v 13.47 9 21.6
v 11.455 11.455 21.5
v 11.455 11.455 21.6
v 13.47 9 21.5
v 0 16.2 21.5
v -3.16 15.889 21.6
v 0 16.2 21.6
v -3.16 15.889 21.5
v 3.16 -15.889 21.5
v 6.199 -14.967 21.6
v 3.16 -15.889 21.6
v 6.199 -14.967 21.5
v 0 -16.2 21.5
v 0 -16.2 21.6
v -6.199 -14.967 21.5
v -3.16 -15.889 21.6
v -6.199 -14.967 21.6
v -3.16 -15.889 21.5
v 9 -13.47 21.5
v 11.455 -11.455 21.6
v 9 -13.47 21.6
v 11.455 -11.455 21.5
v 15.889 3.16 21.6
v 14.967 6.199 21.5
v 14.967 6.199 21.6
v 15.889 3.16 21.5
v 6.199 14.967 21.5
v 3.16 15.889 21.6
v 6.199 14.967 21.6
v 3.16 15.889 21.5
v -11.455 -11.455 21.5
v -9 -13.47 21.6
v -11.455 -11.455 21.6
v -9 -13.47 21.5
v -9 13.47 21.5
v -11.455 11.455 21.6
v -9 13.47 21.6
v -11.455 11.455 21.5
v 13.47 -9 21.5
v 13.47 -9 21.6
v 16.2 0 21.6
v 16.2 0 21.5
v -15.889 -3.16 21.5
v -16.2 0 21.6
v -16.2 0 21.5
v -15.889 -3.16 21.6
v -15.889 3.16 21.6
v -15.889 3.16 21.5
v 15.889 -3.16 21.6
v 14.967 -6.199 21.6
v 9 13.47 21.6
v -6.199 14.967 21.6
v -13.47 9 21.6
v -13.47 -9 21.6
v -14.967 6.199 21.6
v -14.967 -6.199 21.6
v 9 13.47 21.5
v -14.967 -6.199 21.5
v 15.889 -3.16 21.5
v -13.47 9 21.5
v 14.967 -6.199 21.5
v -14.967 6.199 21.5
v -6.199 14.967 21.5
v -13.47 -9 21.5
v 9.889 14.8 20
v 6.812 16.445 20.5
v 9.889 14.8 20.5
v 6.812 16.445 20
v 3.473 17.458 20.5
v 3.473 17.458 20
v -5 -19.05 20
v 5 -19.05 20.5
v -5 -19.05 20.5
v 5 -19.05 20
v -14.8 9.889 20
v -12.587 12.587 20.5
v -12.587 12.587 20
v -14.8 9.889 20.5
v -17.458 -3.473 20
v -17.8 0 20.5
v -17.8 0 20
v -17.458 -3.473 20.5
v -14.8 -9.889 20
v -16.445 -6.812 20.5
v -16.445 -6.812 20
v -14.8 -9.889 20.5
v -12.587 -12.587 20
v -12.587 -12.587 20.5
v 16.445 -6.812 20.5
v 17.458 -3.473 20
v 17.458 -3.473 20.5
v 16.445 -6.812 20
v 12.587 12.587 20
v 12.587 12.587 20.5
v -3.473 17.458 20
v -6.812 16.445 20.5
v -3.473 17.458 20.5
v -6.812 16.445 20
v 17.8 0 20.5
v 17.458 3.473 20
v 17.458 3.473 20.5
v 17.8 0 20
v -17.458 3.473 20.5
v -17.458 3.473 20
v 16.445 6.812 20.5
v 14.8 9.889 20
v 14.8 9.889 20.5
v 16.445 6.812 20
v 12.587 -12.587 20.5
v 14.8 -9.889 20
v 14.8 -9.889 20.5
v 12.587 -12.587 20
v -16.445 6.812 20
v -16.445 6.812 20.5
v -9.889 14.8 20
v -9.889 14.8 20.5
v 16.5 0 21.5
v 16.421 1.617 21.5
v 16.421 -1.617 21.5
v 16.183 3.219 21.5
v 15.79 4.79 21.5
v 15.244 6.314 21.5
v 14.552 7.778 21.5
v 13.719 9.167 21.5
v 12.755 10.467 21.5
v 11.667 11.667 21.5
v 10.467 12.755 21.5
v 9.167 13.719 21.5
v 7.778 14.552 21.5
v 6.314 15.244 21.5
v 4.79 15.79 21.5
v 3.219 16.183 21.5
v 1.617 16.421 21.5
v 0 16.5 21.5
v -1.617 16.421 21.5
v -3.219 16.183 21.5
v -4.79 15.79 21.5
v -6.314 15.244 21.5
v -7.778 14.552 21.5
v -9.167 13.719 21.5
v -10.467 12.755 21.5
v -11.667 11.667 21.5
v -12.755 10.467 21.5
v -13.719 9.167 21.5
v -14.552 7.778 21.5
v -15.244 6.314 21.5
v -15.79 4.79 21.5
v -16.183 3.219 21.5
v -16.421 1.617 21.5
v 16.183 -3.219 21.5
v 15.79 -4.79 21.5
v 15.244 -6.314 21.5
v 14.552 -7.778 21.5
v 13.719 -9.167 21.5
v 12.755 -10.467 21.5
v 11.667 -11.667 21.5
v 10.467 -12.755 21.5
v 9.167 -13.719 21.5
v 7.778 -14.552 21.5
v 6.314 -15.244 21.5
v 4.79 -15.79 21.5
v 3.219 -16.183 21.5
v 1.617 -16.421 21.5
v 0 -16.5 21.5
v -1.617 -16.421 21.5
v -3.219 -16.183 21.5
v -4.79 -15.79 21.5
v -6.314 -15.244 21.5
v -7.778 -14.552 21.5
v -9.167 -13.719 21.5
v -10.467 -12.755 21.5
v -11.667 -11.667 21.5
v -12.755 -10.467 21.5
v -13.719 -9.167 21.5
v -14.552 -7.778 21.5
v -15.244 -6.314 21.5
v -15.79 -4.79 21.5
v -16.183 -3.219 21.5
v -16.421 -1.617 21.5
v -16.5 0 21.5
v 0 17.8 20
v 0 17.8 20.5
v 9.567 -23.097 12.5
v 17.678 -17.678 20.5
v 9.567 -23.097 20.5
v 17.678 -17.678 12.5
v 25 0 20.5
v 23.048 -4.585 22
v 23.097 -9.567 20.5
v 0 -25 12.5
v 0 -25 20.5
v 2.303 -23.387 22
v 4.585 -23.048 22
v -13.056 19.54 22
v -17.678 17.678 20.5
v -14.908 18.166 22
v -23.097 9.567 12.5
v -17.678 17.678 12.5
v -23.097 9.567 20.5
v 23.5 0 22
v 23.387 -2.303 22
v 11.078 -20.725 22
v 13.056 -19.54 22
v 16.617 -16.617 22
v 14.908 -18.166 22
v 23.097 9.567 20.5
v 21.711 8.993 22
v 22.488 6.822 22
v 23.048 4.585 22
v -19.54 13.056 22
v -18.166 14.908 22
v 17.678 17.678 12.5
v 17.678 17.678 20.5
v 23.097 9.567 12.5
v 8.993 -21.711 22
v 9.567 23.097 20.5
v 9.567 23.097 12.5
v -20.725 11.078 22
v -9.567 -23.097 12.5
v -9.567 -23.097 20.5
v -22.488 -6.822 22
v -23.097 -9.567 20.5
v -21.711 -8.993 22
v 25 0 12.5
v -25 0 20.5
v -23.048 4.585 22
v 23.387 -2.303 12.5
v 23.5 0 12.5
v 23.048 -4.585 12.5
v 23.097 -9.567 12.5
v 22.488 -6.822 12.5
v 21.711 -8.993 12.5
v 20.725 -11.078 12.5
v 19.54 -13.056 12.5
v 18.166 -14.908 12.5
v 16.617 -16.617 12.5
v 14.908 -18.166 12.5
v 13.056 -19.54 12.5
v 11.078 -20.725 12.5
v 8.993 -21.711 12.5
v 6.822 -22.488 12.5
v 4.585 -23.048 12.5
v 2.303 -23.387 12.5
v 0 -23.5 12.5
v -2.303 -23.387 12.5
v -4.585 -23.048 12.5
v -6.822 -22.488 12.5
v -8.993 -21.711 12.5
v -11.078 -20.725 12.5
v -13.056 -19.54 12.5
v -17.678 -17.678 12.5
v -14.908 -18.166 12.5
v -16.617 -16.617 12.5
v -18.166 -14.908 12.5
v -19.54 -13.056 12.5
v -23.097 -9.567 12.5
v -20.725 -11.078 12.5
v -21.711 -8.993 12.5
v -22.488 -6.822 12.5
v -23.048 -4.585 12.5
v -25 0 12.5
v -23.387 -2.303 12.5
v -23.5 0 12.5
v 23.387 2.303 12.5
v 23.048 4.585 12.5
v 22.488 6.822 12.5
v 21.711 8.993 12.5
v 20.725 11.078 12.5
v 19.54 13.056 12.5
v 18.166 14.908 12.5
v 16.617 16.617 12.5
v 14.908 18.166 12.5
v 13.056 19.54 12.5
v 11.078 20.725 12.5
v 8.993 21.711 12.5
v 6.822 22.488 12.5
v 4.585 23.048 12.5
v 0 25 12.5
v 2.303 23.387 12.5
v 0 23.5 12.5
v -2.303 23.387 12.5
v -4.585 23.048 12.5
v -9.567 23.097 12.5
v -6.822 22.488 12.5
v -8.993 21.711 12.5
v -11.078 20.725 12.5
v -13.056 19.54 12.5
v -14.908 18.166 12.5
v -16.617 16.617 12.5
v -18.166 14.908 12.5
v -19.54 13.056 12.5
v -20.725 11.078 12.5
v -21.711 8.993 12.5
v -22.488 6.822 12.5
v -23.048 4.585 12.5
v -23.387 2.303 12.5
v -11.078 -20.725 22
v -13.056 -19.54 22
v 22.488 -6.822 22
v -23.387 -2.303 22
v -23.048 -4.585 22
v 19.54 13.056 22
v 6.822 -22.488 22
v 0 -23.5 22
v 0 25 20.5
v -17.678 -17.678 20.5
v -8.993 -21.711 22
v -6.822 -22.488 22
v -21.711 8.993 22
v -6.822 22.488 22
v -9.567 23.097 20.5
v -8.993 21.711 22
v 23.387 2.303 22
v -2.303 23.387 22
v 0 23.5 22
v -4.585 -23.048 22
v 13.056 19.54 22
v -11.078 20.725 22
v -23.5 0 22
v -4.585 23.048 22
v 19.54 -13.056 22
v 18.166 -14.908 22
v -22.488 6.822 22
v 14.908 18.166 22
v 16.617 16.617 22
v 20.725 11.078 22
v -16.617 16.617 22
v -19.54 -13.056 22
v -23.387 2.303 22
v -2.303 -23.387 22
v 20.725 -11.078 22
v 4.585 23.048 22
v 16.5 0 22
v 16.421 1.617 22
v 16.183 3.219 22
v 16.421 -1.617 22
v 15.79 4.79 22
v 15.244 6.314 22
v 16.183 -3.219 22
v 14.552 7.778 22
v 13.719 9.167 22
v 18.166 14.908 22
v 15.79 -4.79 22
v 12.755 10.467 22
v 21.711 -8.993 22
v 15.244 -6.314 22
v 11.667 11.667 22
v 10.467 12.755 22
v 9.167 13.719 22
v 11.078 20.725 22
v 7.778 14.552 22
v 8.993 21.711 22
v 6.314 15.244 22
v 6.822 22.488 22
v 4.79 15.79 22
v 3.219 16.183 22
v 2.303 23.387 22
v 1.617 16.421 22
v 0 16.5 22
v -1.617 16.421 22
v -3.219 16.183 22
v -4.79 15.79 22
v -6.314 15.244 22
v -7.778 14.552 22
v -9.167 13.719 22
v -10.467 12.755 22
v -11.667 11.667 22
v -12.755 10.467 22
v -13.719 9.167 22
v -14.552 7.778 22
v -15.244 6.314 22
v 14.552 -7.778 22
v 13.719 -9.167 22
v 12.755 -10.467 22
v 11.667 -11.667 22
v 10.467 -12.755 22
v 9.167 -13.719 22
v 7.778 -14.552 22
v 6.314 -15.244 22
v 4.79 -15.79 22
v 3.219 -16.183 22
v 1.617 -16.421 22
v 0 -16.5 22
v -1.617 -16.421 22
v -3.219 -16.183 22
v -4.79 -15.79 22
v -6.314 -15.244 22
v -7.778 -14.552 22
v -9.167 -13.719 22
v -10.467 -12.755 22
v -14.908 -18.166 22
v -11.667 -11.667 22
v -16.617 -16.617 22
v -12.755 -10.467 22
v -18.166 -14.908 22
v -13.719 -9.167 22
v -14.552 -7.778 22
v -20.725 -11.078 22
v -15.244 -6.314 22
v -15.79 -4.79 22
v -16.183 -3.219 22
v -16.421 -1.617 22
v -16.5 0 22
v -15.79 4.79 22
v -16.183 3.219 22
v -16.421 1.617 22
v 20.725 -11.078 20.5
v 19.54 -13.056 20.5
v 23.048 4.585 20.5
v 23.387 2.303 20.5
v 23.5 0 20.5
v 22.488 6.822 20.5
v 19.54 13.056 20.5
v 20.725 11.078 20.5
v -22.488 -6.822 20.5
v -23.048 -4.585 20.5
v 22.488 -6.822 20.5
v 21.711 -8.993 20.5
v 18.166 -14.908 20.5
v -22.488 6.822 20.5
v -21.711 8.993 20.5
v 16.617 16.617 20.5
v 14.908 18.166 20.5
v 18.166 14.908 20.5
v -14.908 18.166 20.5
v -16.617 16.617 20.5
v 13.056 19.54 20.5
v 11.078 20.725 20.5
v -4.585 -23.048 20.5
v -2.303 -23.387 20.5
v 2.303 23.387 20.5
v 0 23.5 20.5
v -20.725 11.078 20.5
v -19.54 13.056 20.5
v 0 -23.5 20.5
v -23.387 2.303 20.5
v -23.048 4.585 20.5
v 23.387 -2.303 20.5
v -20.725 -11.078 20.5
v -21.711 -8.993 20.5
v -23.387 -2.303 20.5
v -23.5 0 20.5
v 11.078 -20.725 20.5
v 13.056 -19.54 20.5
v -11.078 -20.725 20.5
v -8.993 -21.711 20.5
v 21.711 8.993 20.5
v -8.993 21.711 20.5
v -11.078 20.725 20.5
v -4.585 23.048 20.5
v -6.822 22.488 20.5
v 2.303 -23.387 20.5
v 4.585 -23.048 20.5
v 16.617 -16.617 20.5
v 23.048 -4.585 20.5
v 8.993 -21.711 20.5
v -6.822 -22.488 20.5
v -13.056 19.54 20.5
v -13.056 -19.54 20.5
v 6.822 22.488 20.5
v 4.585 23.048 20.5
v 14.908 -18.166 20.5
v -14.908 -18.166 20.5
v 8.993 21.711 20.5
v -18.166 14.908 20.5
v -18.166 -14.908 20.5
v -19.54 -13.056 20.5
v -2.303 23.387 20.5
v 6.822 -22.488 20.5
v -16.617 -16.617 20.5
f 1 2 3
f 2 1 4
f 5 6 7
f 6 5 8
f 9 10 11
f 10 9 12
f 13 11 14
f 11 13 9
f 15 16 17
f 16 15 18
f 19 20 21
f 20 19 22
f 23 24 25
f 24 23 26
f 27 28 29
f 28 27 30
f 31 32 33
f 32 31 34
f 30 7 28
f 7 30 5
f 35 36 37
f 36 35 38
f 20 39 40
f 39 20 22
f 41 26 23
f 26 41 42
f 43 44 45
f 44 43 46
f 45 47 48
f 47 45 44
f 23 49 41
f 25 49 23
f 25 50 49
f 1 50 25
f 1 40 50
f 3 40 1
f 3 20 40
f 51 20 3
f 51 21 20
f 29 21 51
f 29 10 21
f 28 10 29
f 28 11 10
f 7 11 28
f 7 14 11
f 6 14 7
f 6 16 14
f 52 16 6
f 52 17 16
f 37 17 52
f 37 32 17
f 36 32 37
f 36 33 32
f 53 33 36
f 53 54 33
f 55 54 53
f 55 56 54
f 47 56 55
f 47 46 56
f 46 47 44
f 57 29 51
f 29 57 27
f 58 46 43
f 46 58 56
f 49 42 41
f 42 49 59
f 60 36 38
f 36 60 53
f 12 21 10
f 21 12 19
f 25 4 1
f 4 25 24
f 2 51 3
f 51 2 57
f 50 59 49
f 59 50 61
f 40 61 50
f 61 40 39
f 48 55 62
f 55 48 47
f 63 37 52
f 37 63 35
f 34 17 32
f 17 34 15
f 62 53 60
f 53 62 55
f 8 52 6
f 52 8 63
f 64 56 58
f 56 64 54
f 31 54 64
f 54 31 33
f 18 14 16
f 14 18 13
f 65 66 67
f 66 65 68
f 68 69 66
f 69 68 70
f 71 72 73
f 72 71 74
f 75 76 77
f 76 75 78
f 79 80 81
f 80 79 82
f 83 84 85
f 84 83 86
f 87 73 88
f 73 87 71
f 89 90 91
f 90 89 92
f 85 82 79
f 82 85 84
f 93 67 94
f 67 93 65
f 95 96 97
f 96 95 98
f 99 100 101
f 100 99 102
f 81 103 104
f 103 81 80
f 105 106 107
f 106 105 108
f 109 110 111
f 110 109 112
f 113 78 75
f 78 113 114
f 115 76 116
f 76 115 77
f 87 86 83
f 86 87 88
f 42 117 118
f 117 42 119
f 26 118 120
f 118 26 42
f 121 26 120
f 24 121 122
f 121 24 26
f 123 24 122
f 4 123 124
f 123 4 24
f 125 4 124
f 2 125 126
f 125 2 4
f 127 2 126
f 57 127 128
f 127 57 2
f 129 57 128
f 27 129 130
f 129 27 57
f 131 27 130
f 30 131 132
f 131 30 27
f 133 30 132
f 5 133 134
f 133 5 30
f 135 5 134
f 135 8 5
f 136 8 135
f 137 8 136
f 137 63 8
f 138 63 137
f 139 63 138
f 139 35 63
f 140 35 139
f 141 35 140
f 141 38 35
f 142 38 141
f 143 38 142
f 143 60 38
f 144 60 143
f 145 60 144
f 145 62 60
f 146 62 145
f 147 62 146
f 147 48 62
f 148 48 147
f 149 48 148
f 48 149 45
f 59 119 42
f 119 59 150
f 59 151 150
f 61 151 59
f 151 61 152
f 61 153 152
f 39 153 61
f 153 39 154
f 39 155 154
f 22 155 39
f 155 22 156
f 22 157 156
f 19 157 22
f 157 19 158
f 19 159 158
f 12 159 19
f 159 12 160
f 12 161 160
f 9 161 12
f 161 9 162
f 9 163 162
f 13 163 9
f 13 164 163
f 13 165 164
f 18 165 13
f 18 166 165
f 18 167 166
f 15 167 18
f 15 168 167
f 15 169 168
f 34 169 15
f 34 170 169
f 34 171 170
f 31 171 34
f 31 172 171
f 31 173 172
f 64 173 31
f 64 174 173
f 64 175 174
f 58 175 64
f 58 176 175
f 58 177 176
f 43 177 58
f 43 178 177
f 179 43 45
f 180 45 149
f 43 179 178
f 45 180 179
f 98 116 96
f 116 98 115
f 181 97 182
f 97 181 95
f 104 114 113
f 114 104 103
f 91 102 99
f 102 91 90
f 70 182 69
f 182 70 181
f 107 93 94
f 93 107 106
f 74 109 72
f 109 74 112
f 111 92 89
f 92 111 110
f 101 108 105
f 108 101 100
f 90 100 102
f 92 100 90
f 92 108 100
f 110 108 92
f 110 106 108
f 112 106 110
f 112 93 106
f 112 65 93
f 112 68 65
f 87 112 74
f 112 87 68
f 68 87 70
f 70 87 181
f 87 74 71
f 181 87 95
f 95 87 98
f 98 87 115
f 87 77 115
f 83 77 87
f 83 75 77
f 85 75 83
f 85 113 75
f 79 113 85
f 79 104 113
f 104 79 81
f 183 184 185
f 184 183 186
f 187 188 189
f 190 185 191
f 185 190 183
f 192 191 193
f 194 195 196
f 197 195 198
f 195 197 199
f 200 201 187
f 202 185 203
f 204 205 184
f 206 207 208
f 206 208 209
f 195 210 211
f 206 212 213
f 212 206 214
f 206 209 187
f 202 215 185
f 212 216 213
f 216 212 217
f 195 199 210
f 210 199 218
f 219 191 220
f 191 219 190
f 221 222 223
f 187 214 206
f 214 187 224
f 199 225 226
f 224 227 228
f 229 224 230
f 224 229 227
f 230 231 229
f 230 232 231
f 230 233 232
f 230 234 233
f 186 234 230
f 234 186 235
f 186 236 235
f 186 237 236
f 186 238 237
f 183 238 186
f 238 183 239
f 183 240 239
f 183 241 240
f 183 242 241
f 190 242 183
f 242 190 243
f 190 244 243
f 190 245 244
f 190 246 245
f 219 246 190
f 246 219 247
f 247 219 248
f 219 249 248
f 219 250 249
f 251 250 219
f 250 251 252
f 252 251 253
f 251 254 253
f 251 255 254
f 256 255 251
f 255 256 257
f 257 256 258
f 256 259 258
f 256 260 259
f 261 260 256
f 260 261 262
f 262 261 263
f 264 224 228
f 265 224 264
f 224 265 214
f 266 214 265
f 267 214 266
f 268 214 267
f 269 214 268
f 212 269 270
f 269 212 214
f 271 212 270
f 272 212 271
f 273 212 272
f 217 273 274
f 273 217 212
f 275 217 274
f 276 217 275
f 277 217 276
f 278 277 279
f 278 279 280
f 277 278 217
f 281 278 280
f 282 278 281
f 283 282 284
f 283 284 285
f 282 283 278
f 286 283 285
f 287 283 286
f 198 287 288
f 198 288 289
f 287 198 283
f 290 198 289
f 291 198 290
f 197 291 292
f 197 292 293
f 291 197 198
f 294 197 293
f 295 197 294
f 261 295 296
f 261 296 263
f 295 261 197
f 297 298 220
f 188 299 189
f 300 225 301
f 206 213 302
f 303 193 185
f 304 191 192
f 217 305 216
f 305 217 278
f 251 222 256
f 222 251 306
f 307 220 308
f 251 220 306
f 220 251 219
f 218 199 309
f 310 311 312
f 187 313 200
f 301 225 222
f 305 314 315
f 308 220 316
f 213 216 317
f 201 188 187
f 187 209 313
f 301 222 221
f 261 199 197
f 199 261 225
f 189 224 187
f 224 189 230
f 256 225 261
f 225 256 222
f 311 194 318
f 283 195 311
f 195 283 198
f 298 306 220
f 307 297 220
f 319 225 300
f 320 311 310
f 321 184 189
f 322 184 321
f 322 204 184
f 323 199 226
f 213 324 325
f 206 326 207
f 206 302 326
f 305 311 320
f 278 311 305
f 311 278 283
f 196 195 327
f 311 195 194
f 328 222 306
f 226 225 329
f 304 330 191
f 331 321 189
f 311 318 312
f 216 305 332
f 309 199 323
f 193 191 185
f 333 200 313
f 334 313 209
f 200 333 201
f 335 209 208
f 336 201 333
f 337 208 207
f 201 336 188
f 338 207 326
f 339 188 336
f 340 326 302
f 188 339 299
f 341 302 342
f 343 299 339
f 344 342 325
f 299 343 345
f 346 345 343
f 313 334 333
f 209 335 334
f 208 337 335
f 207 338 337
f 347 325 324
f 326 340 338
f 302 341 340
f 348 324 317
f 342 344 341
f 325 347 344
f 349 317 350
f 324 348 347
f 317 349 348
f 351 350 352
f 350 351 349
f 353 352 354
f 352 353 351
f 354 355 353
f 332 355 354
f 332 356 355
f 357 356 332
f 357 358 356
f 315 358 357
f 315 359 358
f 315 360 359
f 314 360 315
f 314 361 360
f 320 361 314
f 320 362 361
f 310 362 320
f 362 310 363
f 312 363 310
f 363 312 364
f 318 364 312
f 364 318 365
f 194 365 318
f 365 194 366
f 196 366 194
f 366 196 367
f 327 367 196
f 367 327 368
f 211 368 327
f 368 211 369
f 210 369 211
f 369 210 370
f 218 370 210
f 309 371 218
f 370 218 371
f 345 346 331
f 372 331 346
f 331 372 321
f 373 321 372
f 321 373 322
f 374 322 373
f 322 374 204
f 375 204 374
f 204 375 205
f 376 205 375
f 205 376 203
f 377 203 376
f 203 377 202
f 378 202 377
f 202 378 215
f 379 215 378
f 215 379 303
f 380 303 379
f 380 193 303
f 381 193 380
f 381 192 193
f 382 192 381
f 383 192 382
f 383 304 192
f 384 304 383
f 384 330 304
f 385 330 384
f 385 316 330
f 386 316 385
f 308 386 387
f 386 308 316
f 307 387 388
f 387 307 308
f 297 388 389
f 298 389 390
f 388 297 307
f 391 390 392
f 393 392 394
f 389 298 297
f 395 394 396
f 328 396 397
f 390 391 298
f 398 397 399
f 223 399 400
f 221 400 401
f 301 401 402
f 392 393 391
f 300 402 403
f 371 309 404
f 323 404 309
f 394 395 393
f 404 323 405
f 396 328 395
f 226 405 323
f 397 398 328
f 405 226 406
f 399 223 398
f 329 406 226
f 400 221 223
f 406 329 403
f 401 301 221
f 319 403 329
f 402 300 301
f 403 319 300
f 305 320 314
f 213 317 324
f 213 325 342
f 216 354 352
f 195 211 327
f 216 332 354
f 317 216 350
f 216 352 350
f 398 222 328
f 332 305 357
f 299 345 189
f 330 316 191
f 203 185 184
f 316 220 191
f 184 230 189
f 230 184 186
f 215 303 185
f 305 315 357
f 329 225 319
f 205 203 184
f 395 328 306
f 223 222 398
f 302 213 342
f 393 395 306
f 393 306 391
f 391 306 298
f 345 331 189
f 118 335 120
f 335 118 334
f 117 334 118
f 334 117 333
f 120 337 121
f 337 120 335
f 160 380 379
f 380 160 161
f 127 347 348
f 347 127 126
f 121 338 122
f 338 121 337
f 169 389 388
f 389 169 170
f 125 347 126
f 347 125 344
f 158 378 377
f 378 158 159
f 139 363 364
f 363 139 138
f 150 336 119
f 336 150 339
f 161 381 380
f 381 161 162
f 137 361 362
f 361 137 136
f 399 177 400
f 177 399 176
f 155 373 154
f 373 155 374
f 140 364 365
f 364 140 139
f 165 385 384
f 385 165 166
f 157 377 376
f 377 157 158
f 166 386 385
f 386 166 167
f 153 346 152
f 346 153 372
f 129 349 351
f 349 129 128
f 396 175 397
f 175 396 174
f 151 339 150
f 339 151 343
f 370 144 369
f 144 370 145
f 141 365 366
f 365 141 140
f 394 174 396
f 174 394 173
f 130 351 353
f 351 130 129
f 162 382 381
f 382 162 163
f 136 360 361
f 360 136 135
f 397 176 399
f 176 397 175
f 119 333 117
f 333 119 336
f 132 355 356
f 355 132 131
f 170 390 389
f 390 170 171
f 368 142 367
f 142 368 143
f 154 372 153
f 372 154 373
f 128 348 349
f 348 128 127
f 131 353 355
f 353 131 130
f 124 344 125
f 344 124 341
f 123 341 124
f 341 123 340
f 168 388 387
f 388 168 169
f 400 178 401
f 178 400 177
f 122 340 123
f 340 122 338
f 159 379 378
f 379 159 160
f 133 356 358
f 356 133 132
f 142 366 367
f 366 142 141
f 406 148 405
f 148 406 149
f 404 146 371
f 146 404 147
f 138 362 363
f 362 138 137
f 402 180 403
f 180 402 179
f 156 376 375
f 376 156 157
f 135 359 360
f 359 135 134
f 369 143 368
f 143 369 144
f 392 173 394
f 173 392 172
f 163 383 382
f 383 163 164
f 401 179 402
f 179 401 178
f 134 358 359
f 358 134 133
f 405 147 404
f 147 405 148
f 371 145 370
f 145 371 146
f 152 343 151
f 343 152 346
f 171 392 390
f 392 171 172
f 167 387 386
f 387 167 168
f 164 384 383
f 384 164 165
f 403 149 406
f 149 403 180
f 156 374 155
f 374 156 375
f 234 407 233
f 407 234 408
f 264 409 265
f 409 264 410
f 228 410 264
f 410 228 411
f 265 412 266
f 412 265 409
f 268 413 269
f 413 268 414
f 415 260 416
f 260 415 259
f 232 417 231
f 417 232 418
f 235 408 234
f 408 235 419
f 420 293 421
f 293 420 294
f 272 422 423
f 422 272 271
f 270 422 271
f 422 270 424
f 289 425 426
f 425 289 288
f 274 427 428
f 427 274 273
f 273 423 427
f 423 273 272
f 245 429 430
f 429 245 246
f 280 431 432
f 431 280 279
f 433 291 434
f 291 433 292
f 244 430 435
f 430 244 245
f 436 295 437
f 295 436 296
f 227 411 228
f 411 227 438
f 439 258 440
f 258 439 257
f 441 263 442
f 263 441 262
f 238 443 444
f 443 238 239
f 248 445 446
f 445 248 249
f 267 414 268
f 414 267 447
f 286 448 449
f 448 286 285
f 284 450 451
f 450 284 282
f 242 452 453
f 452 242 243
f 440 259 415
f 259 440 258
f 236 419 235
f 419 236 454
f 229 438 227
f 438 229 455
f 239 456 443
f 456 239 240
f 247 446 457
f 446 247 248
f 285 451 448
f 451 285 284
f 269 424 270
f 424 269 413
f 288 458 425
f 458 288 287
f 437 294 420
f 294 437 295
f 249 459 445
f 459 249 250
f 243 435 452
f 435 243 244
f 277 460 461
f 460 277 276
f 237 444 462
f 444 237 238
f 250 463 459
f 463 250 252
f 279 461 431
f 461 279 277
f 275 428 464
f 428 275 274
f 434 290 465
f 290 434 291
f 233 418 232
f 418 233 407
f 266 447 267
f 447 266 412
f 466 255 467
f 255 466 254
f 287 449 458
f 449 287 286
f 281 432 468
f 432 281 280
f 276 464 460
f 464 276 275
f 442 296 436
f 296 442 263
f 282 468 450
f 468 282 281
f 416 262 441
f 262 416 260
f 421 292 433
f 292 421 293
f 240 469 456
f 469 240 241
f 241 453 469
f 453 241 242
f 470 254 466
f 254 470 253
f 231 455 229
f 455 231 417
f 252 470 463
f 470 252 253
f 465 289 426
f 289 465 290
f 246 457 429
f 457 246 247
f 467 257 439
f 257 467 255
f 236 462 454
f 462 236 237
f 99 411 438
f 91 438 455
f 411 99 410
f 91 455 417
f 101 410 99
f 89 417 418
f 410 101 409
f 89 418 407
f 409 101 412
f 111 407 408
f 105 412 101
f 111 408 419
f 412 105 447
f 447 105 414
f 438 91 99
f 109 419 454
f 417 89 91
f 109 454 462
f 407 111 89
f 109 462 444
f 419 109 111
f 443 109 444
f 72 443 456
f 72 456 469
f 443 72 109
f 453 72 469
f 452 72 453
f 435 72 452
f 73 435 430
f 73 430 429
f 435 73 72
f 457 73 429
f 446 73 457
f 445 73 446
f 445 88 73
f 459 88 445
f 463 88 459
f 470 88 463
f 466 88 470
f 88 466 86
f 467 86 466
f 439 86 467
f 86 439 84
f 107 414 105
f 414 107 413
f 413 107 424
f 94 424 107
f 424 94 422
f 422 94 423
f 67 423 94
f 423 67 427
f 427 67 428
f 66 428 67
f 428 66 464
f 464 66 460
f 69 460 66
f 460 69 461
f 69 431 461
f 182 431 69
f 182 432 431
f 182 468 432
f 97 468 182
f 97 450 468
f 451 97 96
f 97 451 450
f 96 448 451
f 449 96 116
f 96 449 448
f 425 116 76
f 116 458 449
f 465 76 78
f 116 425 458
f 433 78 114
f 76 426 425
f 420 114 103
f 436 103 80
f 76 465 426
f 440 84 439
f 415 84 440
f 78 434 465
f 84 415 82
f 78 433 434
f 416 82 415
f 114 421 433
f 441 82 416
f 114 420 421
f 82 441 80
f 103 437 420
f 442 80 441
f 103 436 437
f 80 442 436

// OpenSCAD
/**
 * Martin Egli
 * 2023-03-07
 */

module per23Dummy(loc_res = 64) {
    color("Orange") {
        difference() {
            union() {
                translate([0, 0, 0])
                cylinder(d = 23, h = 4.6, $fn = loc_res);
                translate([0, 0, 0])
                cylinder(d = 17.0, h = 5+4.6, $fn = loc_res);
            }
            translate([0, 0, -1])
            cylinder(d = 13.9, h = 17+2, $fn = loc_res);
        }
    }
}

module per35Dummy(loc_res = 64) {
    color("Orange") {
        difference() {
            union() {
                translate([0, 0, 0])
                cylinder(d = 35.0, h = 4.5, $fn = loc_res);
                translate([0, 0, 0])
                cylinder(d = 28.8, h = 15, $fn = loc_res);
            }
            translate([0, 0, -1])
            cylinder(d = 23.2, h = 17+2, $fn = loc_res);
        }
    }
}

module per58Dummy(loc_res = 64) {
    color("Orange") {
        difference() {
            union() {
                translate([0, 0, 0])
                cylinder(d = 56.5, h = 7.5, $fn = loc_res);
                translate([0, 0, 0])
                cylinder(d = 45.5, h = 10.75, $fn = loc_res);
            }
            translate([0, 0, -1])
            cylinder(d = 40.6, h = 17+2, $fn = loc_res);
        }
    }
}

module per60Dummy(loc_res = 64) {
    color("Orange") {
        difference() {
            union() {
                translate([0, 0, 0])
                cylinder(d = 59.8, h = 7.5, $fn = loc_res);
                translate([0, 0, 0])
                cylinder(d = 49.6, h = 17, $fn = loc_res);
            }
            translate([0, 0, -1])
            cylinder(d = 44.0, h = 17+2, $fn = loc_res);
        }
    }
}

module tft1_28ZollDummy(loc_res = 32) {
    color("White")
    translate([0, 0, 0.1])
    cylinder(d = 32.4, h = 1.5, $fn = loc_res);
    color("DarkGray")
    hull() {
        translate([0, 0, 0])
        cylinder(d = 35.6, h = 1.5, $fn = loc_res);
        translate([-10/2, -38.1/2, 0])
        cube([10, 10, 1.5]);
    }
}

module caseA(loc_res = 32) {
    difference() {
        hull() {
            translate([0, 0, 0])
            cylinder(d = 50, h = 8, $fn = 16);
            translate([0, 0, 0])
            cylinder(d = 50-2*1.5, h = 8+1.5, $fn = 2*loc_res);
        }
        translate([0, 0, -1])
        cylinder(d = 33, h = 15+2, $fn = 2*loc_res);
        translate([0, 0, -1])
        cylinder(d = 50-3, h = 8+1, $fn = 2*loc_res);
        translate([0, 0, -1])
        *cylinder(d = 65, h = 10+1, $fn = 2*loc_res);
        *translate([0, 0, -1])
        cube(40);
    }
    
}
module caseB(loc_res = 32) {
    difference() {
        hull() {
            translate([0, 0, 0])
            cylinder(d = 49, h = 3, $fn = 2*loc_res);
        }
        translate([0, 0, -1])
        cylinder(d = 49-3, h = 10+1, $fn = 2*loc_res);
        *translate([0, 0, -1])
        cube(40);
    }
}

module latchCoutdent(loc_res = 32) {
    hull() {
        translate([0, 0, 0])
        sphere(d = 1, $fn = loc_res);
        translate([0, 0, -1])
        sphere(d = 1, $fn = loc_res);
    }
}

module latchCcut(loc_res = 32) {
    hull() {
        translate([0, 0, 0])
        rotate([0, 90, -2])
        cylinder(d = 1, h = 40, $fn = loc_res);
        translate([0, 0, -2])
        rotate([0, 90, -2])
        cylinder(d = 1, h = 40, $fn = loc_res);
    }
    hull() {
        translate([0, 0, -2])
        rotate([0, 90, -2])
        cylinder(d = 1, h = 40, $fn = loc_res);
        translate([0, 0, -2])
        rotate([0, 90, 10])
        cylinder(d = 1, h = 40, $fn = loc_res);
    }
}
module caseC(loc_res = 32) {
    difference() {
        union() {
            translate([0, 0, 0])
            cylinder(d = 50, h = 10, $fn = 16);
            /*translate([0, 0, 0])
            cylinder(d = 65-0.5, h = 20+10-1, $fn = 2*loc_res);
            
            // latch outdent
            translate([(65-0.5)/2-0.5, 0, 30-0.5]) {
                latchCoutdent();
            }
            translate([-((65-0.5)/2-0.5), 0, 30-0.5]) {
                latchCoutdent();
            }
            translate([0, (65-0.5)/2-0.5, 30-0.5]) {
                latchCoutdent();
            }
            translate([0, -((65-0.5)/2-0.5), 30-0.5]) {
                latchCoutdent();
            }*/
        }
            /*// latch cut
            translate([0, 0, 29.5])
            rotate([0, 0, 0]) {
                latchCcut(loc_res);
            }
            translate([0, 0, 29.5])
            rotate([0, 0, 90]) {
                latchCcut(loc_res);
            }
            translate([0, 0, 29.5])
            rotate([0, 0, 180]) {
                latchCcut(loc_res);
            }
            translate([0, 0, 29.5])
            rotate([0, 0, 270]) {
                latchCcut(loc_res);
            }*/
            
        // micro USB hole
        #hull() {
            translate([-2, 30, 3])
            rotate([90, 0, 0])
            cylinder(d = 3, h = 15, $fn = loc_res);
            translate([+2, 30, 3])
            rotate([90, 0, 0])
            cylinder(d = 3, h = 15, $fn = loc_res);
        }
        translate([0, 0, 1])
        cylinder(d = 50-3, h = 40, $fn = 2*loc_res);
    }
}

*per23Dummy();
*per58Dummy();
*per60Dummy();





*per35Dummy();
translate([0, 0, 20])
tft1_28ZollDummy();

translate([0, 0, 20-7.5])
caseA();
*translate([0, 0, 20-7.5-3])
caseB();
*translate([0, 0, 0])
caseC();
